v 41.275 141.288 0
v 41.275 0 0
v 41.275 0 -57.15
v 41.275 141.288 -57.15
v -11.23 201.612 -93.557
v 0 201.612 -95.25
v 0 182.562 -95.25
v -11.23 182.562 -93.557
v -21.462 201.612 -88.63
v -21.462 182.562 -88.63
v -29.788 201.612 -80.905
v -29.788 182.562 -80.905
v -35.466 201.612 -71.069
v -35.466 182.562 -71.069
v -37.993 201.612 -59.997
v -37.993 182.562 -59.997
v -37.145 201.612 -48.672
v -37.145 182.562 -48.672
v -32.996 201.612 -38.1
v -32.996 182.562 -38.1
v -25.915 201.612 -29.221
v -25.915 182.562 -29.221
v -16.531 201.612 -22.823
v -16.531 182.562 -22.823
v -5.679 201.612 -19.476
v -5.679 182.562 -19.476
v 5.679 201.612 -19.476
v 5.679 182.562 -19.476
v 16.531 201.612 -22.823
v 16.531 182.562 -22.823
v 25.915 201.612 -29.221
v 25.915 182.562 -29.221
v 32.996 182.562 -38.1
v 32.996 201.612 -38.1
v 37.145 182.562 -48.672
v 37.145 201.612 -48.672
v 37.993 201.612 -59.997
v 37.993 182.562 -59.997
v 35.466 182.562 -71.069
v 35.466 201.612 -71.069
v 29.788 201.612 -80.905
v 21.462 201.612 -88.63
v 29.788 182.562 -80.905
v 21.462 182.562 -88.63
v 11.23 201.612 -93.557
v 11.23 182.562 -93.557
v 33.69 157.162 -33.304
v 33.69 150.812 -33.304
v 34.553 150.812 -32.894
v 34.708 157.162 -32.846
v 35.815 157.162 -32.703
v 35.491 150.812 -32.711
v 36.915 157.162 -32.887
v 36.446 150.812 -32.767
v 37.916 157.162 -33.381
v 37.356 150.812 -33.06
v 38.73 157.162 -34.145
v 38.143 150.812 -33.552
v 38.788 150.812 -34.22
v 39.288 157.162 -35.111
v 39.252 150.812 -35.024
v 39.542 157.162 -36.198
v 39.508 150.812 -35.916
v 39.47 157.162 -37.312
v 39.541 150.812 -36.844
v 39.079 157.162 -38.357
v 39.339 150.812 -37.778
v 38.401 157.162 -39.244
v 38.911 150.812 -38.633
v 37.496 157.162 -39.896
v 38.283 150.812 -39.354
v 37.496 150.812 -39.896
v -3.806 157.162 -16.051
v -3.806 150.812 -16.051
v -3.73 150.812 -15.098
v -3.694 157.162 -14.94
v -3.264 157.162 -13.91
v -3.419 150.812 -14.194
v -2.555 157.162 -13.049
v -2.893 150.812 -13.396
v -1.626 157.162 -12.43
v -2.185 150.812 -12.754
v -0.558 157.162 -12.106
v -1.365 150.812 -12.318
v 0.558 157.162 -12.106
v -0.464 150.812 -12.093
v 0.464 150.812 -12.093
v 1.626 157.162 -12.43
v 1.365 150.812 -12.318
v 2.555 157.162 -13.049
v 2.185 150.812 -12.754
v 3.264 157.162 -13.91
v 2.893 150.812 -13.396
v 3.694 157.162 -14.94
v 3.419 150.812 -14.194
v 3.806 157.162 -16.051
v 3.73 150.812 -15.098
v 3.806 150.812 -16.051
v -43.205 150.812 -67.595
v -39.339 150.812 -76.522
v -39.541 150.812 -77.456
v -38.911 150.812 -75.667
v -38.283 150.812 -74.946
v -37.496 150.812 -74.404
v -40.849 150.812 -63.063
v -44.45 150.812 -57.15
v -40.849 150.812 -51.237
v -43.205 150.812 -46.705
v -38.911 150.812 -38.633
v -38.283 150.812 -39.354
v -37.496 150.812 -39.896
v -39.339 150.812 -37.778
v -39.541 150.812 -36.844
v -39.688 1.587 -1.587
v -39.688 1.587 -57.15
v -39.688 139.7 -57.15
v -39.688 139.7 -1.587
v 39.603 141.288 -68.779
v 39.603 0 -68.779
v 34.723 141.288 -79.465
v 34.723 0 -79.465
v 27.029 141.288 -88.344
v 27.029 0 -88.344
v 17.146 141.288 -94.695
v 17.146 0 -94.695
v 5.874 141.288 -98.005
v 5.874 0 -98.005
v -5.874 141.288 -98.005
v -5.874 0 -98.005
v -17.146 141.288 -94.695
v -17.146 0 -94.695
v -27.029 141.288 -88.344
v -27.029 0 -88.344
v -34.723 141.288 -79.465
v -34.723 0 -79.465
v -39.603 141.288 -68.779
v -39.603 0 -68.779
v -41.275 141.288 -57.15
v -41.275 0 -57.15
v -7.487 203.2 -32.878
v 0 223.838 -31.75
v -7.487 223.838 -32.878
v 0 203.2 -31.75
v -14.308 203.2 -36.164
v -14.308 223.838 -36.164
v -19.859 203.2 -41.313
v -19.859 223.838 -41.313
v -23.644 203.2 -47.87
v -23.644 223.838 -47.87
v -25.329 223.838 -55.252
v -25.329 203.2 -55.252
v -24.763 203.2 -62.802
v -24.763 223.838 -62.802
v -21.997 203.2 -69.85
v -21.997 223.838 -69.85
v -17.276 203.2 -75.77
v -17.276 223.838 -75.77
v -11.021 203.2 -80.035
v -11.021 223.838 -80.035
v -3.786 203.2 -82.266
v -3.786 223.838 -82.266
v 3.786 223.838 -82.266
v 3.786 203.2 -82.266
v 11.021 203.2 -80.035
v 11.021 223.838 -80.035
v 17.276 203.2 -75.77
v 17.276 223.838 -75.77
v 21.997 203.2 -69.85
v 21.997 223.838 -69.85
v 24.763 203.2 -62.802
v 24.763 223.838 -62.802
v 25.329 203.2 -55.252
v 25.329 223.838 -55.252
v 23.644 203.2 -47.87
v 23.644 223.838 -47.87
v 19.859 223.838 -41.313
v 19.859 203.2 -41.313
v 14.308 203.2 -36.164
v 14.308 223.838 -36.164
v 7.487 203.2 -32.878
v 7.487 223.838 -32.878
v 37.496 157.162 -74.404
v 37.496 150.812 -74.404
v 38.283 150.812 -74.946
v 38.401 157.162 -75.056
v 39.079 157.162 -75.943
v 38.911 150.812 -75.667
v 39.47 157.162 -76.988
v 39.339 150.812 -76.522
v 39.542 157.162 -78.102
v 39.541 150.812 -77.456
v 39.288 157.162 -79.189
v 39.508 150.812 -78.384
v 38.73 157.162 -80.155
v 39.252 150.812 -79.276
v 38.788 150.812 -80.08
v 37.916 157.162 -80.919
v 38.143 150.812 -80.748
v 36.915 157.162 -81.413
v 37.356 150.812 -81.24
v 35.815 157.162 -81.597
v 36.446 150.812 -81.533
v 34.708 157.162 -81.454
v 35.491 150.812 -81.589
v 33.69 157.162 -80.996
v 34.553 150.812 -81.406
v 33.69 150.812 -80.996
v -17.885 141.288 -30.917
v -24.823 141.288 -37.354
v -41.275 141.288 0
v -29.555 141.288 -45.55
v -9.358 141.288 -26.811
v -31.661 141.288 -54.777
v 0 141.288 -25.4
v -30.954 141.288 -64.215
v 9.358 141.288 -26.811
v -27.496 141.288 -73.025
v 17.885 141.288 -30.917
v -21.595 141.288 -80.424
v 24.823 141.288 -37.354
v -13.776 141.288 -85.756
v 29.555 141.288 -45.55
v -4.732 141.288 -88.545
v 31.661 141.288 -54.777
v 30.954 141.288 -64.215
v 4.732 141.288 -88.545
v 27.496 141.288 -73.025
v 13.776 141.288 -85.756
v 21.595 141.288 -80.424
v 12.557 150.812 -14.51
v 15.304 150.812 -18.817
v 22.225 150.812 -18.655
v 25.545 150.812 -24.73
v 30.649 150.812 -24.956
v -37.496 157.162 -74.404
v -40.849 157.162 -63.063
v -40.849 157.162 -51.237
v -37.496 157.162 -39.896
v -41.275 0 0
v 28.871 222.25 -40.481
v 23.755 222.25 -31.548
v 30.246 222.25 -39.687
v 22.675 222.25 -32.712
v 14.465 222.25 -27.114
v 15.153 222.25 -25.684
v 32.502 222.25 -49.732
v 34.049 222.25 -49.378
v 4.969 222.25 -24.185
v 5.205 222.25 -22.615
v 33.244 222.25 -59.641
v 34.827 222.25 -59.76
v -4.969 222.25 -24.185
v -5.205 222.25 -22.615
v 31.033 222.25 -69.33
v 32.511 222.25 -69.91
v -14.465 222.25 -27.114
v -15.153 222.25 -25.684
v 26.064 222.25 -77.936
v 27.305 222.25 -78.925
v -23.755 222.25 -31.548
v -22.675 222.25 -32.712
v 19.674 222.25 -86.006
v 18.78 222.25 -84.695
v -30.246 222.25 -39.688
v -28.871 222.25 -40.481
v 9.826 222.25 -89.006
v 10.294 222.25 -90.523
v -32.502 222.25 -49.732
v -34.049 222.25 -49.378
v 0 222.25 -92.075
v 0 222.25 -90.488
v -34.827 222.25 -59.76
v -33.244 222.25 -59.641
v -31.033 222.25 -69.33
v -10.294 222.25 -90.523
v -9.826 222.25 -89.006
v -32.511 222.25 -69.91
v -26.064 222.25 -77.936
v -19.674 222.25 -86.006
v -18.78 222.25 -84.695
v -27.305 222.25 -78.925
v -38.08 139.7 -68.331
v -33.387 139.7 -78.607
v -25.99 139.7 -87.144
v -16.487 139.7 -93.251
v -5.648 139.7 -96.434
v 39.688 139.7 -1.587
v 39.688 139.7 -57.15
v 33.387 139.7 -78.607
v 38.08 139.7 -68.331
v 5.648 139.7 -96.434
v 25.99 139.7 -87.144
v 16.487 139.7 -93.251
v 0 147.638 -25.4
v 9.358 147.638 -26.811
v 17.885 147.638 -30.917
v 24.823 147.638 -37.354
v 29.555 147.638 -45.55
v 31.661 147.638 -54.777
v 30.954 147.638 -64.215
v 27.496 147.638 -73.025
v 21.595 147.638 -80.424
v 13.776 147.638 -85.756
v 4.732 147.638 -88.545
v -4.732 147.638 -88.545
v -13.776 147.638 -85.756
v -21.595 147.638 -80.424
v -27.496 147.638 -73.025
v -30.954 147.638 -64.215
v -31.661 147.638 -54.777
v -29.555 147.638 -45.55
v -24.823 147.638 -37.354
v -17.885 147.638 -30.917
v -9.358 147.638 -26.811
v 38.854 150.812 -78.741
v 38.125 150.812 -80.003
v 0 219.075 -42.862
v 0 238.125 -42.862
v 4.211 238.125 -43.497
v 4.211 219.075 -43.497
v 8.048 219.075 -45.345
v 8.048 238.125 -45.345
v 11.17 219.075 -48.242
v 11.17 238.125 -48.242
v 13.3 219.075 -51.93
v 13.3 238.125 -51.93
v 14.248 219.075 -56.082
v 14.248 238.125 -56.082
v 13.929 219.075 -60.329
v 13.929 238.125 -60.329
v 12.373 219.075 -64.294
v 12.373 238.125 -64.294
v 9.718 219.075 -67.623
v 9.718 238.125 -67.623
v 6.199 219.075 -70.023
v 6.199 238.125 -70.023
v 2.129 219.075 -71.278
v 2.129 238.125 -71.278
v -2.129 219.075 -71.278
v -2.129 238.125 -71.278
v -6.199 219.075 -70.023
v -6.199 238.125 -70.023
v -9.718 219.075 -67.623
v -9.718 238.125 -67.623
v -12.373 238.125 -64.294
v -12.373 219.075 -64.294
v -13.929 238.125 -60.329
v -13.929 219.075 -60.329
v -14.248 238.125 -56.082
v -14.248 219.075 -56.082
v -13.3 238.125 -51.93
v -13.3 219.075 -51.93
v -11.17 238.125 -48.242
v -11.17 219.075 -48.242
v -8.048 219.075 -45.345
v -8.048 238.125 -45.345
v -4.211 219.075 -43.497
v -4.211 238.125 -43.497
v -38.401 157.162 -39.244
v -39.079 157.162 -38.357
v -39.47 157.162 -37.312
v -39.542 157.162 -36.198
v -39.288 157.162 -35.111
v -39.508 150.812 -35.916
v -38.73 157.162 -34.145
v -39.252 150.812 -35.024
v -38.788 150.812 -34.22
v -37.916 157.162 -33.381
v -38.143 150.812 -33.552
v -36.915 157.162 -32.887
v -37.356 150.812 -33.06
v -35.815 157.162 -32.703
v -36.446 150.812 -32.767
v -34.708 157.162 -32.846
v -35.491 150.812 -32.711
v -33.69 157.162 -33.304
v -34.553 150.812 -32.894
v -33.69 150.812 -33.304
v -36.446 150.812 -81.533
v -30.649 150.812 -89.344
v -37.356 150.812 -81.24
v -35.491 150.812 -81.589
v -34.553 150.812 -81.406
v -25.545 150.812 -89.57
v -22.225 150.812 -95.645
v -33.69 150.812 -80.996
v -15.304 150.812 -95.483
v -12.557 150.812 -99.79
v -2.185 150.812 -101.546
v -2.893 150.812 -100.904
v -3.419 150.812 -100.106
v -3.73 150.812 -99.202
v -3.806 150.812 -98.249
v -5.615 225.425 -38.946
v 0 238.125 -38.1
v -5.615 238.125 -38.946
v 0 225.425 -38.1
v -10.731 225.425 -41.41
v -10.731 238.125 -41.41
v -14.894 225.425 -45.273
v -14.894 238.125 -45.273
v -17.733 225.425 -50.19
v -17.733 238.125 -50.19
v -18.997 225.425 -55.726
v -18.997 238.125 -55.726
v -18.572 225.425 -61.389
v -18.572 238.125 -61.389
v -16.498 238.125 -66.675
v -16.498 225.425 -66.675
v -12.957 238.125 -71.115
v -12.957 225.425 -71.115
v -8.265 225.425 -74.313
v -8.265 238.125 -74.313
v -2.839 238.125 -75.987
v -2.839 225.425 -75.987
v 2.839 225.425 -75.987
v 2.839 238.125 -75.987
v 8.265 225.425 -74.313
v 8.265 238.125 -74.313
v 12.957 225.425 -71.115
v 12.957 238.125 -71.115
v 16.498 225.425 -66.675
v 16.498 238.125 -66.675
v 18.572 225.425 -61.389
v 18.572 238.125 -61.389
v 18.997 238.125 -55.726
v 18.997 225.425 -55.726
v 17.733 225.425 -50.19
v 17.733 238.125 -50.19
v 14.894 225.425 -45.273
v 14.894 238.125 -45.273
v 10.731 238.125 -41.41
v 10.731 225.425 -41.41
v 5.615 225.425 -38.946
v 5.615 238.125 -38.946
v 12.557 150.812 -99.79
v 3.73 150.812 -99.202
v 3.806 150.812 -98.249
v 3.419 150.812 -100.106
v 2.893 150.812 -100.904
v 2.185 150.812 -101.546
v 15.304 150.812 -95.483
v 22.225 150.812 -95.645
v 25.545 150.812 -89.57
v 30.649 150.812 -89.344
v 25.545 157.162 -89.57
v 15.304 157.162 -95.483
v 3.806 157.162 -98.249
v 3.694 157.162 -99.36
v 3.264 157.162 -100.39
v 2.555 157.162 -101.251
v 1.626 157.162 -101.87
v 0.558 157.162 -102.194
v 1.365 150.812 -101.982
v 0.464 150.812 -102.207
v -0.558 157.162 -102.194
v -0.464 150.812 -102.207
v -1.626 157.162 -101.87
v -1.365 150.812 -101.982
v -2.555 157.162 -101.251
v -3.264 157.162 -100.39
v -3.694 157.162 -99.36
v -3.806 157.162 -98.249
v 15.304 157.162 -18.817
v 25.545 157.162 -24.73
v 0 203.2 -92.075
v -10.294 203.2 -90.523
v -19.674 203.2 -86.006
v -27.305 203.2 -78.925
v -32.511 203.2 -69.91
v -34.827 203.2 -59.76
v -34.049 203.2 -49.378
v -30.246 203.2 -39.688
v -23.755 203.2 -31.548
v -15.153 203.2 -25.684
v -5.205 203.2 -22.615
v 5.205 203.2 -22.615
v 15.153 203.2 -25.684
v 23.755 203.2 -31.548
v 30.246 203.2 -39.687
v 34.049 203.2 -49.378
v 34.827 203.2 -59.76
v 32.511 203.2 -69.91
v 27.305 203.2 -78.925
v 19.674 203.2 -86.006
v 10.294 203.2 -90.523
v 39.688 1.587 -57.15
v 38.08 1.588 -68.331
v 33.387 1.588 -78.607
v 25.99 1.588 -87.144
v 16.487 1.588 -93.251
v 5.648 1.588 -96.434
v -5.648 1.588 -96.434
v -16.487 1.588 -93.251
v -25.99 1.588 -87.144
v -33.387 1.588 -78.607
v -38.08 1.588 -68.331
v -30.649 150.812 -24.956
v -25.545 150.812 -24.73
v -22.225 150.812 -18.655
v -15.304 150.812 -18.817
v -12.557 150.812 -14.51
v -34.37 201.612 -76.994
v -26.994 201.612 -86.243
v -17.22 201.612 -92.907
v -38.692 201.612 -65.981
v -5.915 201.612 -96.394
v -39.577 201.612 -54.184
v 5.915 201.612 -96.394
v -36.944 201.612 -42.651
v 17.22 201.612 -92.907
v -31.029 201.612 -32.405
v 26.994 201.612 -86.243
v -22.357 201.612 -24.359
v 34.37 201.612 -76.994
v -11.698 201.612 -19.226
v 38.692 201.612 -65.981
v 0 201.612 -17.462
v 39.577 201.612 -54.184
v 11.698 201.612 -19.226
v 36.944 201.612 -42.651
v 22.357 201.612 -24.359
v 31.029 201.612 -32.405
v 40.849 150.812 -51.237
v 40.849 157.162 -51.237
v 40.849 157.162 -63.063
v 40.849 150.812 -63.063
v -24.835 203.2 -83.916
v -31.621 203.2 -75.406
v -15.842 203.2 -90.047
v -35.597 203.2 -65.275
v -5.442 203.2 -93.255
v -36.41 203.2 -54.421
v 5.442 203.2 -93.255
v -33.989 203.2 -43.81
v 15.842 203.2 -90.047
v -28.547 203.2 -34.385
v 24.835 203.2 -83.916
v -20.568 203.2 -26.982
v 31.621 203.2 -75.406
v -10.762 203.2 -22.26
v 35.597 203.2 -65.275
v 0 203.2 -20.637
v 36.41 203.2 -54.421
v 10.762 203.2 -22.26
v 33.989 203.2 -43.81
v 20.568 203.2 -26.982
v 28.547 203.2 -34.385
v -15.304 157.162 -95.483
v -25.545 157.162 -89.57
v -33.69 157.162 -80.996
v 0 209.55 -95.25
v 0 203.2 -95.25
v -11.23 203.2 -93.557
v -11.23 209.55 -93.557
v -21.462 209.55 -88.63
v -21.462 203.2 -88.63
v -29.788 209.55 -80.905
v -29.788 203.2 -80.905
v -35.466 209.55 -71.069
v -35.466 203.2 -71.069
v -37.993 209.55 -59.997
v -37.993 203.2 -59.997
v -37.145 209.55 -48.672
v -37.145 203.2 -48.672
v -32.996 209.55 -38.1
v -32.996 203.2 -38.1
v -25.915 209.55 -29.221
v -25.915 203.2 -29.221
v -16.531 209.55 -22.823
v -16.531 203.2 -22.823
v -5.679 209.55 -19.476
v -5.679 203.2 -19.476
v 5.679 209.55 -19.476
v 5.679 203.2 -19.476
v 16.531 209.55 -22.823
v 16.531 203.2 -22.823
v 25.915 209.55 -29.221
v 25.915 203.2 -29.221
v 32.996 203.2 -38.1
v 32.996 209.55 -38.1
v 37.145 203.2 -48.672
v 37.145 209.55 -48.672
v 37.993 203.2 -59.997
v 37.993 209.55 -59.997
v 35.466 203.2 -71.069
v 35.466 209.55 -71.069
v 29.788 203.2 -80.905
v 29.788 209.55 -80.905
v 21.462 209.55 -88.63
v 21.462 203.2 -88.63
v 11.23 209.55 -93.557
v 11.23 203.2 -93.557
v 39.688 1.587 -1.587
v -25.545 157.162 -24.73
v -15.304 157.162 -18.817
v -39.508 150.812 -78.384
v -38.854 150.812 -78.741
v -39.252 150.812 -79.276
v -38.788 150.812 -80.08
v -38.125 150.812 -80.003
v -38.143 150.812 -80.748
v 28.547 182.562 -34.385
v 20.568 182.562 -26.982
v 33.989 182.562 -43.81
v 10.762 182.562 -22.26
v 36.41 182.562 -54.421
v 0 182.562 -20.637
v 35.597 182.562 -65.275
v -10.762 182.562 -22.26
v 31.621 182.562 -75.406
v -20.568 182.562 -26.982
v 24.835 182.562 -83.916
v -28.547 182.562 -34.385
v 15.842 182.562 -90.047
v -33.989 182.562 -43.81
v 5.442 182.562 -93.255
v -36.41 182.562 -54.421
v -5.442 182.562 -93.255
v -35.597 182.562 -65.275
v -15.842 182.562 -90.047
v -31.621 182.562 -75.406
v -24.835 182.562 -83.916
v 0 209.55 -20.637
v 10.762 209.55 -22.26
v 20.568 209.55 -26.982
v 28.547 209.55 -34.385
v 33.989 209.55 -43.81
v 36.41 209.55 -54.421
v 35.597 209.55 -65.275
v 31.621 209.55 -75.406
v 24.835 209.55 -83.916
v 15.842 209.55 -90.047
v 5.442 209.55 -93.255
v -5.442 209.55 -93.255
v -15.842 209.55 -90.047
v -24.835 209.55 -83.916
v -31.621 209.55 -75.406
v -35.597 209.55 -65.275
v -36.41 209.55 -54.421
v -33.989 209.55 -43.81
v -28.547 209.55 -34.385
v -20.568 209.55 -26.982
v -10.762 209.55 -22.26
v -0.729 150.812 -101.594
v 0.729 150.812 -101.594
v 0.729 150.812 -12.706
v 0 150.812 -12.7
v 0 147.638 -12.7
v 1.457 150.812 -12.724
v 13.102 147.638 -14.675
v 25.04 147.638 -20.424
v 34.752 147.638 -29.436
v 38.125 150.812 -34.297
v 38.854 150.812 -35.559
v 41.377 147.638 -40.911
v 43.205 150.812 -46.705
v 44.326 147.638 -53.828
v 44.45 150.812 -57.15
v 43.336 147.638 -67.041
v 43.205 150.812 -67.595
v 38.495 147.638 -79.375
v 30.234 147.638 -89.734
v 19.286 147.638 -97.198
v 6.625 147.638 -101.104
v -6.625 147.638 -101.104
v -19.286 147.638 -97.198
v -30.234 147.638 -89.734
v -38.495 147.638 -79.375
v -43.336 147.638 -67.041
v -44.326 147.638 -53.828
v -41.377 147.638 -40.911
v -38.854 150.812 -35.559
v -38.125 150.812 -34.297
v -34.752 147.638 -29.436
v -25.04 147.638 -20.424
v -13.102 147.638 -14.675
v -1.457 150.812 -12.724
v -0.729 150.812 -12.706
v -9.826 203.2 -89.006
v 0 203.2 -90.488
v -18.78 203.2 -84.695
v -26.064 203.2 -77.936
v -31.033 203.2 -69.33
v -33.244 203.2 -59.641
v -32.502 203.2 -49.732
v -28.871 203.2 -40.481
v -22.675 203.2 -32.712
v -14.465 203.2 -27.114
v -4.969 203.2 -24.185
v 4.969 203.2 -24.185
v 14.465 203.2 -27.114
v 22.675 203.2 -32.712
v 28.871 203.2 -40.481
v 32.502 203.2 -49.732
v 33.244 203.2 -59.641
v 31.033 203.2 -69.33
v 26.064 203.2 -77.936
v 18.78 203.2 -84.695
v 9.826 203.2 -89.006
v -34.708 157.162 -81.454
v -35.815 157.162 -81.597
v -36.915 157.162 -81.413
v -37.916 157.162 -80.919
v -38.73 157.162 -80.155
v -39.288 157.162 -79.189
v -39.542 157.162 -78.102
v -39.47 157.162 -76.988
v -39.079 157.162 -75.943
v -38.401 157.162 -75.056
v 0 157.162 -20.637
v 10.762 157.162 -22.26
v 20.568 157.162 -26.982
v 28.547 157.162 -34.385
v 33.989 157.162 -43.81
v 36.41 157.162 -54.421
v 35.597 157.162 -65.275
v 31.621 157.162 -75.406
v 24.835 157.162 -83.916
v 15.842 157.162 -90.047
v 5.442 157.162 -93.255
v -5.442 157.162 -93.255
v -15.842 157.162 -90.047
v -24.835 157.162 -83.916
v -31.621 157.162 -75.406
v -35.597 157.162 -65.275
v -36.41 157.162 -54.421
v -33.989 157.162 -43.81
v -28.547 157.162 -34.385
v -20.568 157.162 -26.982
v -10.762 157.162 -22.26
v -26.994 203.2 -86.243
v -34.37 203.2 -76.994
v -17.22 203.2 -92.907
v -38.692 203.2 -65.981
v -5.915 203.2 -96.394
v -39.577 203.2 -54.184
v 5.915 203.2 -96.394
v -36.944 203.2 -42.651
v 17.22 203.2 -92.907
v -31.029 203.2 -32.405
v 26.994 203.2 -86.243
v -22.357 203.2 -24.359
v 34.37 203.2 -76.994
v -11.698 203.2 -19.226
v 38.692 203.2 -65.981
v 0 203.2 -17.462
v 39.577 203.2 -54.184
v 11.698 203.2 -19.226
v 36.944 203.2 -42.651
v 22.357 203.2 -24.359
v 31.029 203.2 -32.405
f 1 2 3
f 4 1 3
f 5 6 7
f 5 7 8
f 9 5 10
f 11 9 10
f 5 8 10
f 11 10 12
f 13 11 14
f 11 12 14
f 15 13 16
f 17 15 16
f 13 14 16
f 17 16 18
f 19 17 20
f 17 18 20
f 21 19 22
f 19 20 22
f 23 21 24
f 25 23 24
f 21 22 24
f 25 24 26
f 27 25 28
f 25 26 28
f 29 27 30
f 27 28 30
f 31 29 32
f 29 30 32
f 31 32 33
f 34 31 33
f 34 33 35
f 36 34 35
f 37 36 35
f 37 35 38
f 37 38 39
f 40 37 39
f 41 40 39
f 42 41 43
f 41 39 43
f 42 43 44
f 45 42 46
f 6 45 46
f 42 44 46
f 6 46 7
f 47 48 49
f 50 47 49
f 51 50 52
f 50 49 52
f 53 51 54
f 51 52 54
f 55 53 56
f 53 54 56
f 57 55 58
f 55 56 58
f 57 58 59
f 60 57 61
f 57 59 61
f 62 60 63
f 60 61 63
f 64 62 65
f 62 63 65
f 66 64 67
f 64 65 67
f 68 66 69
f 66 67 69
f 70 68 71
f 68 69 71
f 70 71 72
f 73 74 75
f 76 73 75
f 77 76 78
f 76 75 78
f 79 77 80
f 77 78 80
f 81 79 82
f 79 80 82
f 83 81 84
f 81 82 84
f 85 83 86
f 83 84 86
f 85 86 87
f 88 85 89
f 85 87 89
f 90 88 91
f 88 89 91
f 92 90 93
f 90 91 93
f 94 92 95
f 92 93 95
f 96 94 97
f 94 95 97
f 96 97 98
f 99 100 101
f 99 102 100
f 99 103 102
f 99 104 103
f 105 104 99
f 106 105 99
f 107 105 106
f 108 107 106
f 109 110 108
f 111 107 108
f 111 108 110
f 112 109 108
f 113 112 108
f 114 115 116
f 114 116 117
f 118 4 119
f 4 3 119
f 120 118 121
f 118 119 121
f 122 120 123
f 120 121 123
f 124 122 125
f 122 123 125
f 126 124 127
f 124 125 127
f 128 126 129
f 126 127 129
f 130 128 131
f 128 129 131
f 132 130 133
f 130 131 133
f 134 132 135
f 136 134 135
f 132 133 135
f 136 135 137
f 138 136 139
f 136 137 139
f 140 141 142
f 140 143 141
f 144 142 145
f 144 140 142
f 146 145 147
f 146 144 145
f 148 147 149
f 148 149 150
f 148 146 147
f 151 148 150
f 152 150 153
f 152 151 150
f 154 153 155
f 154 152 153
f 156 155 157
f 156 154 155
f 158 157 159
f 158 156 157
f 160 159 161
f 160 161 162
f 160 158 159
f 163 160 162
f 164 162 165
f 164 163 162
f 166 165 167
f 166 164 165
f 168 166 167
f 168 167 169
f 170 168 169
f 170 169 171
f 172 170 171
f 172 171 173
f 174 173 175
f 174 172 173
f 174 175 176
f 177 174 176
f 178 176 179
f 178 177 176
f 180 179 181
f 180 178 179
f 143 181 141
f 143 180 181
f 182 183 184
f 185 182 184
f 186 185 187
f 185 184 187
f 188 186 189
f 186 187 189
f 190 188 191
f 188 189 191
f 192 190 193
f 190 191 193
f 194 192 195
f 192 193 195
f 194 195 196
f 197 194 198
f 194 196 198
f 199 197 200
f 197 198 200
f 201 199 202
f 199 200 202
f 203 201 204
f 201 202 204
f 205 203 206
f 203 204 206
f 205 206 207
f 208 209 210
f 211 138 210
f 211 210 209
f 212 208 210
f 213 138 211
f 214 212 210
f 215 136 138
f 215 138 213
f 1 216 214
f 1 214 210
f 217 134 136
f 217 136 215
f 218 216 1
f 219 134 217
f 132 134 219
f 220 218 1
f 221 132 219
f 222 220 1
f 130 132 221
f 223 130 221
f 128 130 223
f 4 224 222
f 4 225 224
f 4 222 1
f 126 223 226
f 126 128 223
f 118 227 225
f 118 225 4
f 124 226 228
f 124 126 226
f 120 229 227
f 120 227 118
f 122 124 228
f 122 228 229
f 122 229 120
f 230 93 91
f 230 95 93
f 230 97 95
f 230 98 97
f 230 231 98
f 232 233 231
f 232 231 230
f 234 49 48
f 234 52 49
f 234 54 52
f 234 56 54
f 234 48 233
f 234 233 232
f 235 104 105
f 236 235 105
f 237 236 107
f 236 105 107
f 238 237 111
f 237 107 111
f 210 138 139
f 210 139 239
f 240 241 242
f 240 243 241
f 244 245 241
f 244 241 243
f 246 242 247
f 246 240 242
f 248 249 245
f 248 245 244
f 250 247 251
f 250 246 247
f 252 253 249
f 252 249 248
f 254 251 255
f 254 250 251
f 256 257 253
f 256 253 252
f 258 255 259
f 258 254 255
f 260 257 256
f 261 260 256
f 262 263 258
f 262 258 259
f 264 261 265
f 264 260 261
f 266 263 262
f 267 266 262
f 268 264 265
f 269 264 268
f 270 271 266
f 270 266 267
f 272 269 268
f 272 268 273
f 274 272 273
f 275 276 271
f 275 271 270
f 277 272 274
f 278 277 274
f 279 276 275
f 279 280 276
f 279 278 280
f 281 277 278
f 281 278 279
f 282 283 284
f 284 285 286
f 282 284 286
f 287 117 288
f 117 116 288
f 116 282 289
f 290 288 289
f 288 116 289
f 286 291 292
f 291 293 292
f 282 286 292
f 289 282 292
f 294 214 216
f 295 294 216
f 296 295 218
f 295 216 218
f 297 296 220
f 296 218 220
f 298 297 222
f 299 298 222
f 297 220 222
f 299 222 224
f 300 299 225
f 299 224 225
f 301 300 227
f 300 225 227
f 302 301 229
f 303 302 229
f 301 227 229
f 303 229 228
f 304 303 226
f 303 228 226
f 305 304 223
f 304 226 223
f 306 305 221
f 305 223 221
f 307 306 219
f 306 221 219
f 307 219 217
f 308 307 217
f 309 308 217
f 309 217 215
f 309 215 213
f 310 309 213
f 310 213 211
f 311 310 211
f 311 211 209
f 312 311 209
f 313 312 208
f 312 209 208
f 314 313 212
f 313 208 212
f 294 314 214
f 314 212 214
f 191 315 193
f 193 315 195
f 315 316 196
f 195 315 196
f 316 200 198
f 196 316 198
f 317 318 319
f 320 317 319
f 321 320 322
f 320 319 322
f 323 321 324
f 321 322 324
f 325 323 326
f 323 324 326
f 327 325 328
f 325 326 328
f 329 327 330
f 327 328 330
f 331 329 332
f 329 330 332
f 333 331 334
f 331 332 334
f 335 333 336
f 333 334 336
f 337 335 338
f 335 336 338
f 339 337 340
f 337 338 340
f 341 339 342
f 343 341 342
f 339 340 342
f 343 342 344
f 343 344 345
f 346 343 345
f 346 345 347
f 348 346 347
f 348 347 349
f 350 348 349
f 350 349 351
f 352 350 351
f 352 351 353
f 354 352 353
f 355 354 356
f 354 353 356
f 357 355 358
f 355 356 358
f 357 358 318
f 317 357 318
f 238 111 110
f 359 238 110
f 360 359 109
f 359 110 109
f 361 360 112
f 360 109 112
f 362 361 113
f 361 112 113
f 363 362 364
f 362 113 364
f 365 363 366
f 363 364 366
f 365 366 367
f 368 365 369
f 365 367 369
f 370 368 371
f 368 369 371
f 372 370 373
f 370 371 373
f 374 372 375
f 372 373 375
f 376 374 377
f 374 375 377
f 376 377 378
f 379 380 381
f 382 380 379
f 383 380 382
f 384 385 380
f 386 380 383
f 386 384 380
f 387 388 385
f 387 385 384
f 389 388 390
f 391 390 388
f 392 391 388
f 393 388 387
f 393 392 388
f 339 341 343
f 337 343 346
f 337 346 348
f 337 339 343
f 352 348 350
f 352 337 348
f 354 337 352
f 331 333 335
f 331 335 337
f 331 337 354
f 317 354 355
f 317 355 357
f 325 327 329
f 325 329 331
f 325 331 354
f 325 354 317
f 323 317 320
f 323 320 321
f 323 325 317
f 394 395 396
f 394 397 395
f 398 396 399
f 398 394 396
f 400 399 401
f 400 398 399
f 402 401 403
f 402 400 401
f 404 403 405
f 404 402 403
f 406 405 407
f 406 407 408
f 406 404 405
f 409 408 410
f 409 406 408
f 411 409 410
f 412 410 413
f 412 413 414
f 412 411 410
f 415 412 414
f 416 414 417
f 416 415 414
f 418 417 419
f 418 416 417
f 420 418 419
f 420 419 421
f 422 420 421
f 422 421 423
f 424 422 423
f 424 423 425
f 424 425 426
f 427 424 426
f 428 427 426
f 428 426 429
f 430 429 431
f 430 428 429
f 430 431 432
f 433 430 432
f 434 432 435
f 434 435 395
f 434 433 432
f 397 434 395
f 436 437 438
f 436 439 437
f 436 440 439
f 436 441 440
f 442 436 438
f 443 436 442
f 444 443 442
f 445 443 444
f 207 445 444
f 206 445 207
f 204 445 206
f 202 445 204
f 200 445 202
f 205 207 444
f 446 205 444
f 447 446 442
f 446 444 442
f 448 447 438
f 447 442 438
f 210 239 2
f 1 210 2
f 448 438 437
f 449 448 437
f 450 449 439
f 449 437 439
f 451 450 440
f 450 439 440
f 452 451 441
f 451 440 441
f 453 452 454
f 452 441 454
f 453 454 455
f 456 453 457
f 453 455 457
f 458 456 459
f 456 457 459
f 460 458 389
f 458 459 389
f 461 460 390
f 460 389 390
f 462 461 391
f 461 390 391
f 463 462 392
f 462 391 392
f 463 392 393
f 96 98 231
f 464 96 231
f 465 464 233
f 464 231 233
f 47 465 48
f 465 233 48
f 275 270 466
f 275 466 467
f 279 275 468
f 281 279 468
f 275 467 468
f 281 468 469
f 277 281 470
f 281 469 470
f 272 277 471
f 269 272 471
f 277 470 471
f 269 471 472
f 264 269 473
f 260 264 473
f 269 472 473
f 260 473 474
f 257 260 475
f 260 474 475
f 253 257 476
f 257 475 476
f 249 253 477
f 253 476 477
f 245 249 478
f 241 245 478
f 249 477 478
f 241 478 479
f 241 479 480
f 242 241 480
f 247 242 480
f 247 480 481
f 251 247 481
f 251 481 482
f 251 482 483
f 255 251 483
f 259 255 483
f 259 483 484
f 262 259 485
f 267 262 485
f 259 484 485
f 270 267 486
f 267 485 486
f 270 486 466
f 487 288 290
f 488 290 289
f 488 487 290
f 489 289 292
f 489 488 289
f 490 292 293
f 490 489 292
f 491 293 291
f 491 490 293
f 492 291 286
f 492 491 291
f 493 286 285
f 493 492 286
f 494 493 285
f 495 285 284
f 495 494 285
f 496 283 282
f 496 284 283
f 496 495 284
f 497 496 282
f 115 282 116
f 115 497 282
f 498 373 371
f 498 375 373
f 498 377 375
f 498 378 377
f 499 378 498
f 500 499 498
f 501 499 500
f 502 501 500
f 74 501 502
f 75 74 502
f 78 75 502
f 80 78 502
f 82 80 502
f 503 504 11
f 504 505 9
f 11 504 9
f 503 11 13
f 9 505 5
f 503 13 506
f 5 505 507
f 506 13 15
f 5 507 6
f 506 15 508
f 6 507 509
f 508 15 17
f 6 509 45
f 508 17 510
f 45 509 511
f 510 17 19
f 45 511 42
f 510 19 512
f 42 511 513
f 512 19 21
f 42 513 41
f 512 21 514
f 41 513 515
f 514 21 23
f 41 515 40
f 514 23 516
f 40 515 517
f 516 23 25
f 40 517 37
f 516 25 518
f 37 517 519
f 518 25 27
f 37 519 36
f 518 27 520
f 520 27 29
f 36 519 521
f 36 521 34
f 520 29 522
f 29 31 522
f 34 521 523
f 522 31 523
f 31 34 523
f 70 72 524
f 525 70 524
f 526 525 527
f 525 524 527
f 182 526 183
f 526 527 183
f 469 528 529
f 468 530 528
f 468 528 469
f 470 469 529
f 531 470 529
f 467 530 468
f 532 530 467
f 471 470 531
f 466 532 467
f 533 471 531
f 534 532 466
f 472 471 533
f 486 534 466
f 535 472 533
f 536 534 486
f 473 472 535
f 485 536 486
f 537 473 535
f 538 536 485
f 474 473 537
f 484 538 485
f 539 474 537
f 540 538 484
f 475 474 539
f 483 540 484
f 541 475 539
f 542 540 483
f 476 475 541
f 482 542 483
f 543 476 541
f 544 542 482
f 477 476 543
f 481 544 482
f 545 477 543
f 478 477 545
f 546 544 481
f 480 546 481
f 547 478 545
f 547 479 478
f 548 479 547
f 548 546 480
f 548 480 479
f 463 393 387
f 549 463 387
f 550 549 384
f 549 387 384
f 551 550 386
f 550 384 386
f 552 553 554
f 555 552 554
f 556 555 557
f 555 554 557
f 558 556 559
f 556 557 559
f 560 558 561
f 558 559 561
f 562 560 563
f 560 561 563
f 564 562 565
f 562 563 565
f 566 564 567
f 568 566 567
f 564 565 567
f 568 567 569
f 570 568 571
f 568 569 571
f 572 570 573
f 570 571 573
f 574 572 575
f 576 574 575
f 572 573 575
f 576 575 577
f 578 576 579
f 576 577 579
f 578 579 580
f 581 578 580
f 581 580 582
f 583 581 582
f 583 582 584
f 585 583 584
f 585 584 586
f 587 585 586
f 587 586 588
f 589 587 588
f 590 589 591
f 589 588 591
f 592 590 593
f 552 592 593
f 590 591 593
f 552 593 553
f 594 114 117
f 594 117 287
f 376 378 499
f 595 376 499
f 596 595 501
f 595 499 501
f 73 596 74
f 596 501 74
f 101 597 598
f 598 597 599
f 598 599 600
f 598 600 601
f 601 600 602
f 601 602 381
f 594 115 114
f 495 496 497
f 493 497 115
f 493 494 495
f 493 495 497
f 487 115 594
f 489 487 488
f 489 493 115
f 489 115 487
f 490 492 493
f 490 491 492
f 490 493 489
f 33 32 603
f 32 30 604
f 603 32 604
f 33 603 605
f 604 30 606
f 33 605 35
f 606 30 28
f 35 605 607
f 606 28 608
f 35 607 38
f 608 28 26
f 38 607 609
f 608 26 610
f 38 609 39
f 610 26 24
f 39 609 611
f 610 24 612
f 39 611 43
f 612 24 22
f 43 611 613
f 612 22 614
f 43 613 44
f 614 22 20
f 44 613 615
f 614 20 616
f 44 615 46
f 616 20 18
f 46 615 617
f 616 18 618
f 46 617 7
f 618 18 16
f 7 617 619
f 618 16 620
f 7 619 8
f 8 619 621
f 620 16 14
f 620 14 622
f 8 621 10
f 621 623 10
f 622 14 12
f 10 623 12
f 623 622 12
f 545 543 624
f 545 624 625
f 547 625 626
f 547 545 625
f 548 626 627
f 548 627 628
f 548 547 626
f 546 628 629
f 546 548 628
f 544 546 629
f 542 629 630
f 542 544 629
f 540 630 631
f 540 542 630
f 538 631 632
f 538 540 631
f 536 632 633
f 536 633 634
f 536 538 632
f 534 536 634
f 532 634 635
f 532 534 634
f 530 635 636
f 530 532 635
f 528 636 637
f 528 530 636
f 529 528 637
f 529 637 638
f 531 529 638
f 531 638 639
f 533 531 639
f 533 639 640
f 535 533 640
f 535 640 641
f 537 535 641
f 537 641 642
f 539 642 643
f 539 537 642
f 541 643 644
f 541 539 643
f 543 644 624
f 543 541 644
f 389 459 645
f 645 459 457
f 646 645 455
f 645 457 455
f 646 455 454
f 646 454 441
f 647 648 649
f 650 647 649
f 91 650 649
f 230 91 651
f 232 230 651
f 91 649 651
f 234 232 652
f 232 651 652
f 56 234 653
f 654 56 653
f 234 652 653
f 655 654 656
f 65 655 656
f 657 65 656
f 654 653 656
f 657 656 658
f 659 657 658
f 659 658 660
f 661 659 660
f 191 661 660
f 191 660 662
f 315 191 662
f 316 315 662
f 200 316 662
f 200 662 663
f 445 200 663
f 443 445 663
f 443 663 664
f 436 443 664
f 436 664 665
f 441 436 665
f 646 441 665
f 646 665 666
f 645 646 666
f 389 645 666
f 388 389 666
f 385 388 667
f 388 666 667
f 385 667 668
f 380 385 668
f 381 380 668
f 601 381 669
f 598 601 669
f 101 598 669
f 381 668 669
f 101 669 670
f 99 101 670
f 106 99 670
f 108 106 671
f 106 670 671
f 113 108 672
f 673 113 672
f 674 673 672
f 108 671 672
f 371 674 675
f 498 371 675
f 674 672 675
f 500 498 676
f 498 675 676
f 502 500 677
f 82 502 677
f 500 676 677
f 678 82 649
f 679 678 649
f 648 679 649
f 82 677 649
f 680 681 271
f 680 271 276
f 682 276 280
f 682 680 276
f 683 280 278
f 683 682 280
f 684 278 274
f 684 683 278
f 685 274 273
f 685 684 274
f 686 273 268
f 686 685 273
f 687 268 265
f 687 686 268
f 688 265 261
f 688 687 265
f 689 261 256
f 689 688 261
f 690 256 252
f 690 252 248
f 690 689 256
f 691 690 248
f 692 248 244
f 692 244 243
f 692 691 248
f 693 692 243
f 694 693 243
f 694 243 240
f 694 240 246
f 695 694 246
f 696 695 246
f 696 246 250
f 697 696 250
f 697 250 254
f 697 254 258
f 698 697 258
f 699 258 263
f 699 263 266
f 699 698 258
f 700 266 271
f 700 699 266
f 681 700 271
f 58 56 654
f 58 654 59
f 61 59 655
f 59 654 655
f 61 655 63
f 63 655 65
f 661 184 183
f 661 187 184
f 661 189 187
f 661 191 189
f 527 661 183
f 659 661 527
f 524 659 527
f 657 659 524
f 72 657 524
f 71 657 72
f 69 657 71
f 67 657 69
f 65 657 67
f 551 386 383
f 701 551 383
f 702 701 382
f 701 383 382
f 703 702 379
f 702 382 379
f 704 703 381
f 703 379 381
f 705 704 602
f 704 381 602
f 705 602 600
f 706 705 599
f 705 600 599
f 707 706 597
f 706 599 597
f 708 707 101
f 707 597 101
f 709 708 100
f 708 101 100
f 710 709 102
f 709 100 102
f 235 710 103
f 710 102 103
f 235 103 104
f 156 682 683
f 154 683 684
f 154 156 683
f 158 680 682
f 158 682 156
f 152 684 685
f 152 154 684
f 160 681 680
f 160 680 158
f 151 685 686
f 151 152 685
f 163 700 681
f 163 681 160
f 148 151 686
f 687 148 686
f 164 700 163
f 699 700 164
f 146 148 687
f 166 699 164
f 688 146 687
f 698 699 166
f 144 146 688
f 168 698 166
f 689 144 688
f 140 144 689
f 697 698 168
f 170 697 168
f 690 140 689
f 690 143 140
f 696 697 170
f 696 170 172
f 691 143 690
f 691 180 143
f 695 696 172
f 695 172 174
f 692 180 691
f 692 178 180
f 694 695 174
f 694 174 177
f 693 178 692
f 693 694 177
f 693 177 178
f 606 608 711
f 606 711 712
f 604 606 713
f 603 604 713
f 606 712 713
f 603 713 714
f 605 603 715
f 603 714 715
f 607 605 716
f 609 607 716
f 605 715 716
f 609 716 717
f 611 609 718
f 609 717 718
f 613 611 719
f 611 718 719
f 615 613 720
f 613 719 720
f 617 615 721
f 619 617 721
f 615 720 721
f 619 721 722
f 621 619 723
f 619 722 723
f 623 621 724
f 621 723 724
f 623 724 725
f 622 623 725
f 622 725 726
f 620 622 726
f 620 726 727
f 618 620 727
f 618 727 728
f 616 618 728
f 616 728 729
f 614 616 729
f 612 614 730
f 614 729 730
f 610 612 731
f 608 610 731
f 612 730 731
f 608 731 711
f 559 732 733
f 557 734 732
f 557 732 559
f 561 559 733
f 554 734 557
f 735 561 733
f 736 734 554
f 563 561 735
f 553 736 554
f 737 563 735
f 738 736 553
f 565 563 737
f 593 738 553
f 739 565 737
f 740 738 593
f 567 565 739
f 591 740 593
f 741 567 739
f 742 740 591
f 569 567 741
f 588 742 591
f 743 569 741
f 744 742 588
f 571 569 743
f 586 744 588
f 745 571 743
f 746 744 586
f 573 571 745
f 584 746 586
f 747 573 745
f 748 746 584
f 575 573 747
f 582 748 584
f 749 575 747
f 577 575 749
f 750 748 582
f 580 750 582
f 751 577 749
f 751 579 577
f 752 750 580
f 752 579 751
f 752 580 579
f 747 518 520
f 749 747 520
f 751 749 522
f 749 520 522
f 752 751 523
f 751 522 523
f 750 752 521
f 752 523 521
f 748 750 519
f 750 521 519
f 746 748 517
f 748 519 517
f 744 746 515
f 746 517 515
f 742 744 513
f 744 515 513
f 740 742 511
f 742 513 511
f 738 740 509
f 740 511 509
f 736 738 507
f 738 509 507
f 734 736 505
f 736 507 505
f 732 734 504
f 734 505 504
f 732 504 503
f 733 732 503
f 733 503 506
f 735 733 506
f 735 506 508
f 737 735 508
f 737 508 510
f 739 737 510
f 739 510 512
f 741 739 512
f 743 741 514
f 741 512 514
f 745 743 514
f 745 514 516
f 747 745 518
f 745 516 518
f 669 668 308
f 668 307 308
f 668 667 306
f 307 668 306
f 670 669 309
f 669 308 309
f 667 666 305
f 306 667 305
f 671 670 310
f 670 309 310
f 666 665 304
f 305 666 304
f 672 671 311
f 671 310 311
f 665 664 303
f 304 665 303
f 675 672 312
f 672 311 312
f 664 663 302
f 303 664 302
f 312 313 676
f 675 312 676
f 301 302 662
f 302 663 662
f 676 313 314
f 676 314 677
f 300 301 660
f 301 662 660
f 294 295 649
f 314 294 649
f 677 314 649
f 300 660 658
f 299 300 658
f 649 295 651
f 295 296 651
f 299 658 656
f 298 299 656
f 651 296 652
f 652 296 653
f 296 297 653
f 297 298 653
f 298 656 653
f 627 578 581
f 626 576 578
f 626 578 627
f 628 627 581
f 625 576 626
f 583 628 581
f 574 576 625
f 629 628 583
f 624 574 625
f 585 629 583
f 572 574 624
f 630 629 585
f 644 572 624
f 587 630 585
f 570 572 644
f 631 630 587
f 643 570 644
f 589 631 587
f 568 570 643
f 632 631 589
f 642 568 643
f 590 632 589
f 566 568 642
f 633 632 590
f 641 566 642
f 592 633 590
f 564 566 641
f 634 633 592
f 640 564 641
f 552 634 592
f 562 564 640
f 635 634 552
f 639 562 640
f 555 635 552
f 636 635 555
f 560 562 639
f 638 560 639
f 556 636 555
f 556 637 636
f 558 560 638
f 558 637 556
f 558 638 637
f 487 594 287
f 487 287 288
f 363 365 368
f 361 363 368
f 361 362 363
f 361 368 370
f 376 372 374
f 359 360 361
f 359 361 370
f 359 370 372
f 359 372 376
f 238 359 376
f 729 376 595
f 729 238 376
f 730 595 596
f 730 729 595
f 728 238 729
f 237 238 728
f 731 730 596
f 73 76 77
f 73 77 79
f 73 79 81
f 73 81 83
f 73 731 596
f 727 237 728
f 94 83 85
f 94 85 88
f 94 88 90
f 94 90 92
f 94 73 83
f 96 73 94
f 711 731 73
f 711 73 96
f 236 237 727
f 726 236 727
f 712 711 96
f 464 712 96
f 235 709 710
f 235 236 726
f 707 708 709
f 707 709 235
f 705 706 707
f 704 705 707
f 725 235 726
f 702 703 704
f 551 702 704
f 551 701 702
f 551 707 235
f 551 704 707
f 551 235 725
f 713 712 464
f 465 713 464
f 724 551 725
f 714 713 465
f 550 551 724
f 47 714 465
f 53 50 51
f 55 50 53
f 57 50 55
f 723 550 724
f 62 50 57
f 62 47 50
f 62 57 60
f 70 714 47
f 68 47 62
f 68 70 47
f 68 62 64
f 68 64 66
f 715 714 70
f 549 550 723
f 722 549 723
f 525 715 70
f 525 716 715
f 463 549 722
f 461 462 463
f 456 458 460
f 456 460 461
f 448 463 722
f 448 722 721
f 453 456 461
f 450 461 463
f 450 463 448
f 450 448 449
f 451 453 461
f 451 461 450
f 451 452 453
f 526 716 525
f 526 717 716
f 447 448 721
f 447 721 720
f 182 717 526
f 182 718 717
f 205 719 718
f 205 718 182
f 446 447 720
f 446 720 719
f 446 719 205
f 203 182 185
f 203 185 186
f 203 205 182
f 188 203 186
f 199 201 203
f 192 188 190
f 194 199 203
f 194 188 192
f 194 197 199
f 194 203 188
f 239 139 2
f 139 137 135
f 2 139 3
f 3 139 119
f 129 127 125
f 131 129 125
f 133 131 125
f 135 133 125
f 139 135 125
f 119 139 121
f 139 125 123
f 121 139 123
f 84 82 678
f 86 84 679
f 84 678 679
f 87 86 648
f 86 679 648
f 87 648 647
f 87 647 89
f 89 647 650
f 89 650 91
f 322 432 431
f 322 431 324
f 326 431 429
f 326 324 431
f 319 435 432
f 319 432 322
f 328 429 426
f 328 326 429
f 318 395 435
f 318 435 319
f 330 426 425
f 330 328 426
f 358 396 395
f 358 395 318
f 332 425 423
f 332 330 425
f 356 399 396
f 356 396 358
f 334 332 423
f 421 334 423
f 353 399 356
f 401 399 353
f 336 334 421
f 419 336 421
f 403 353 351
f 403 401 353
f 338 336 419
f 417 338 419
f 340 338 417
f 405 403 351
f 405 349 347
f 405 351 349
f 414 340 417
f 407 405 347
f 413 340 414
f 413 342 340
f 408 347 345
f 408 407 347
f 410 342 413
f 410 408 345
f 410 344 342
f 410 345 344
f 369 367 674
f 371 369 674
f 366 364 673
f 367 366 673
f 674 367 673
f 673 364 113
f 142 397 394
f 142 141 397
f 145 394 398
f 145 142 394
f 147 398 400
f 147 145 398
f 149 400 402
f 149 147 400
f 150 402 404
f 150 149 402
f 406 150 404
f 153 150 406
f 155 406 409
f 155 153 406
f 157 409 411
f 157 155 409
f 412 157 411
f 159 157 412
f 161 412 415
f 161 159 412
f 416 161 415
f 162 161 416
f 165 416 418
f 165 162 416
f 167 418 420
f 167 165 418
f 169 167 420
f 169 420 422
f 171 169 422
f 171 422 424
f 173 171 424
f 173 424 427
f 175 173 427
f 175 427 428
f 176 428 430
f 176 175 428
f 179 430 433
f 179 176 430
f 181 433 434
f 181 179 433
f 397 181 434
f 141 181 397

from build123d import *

# Parameters (mm, degrees)
BOSS_EXTRUDE1_DEPTH  = 139.7
SHELL1_T             = -1.5875
BOSS_EXTRUDE2_DEPTH  = 1.5875
SKETCH3_R            = 31.75
BOSS_EXTRUDE3_DEPTH  = 6.35
SKETCH4_R            = 44.45
BOSS_EXTRUDE4_DEPTH  = 3.175
BOSS_EXTRUDE5_DEPTH  = 6.35
SKETCH6_R            = 36.5125
BOSS_EXTRUDE6_DEPTH  = 25.4
SKETCH8_R            = 38.1
BOSS_EXTRUDE7_DEPTH  = 19.05
SKETCH9_R            = 39.6875
BOSS_EXTRUDE8_DEPTH  = 1.5875
SKETCH10_R           = 38.1
SKETCH10_R_2         = 36.5125
BOSS_EXTRUDE9_DEPTH  = 6.35
SKETCH12_R           = 34.925
SKETCH12_R_2         = 33.3375
BOSS_EXTRUDE10_DEPTH = 19.05
SKETCH15_R           = 14.2875
CUT_EXTRUDE1_DEPTH   = 19.05


with BuildPart() as part:
    # Sketch1 → Boss-Extrude1 (new body)
    with BuildSketch(Plane(origin=(0, 0, 0), x_dir=(1, 0, 0), z_dir=(0, 1, 0))):
        with BuildLine():
            Line((-41.275, 0), (41.275, 0))
            Line((41.275, 0), (41.275, 57.15))
            ThreePointArc((41.275, 57.15), (0, 98.425), (-41.275, 57.15))
            Line((-41.275, 57.15), (-41.275, 0))
        make_face()
    extrude(amount=BOSS_EXTRUDE1_DEPTH)

    # Shell1
    shell1_openings = [part.faces().sort_by_distance(p)[0] for p in [
        (0, 139.7, -45.257423889),
    ]]
    offset(amount=SHELL1_T, openings=shell1_openings, kind=Kind.INTERSECTION)

    # Sketch2 → Boss-Extrude2 (add)
    with BuildSketch(Plane(origin=(0, 139.7, 0), x_dir=(1, 0, 0), z_dir=(0, 1, 0))):
        with BuildLine():
            Line((41.275, 0), (41.275, 57.15))
            ThreePointArc((41.275, 57.15), (0, 98.425), (-41.275, 57.15))
            Line((-41.275, 57.15), (-41.275, 0))
            Line((-41.275, 0), (41.275, 0))
        make_face()
    extrude(amount=BOSS_EXTRUDE2_DEPTH)

    # Sketch3 → Boss-Extrude3 (add)
    with BuildSketch(Plane(origin=(0, 141.2875, 0), x_dir=(1, 0, 0), z_dir=(0, 1, 0))):
        with Locations(Location((0, 57.15, 0), (0, 0, 270))):
            Circle(SKETCH3_R)
    extrude(amount=BOSS_EXTRUDE3_DEPTH)

    # Sketch4 → Boss-Extrude4 (add)
    with BuildSketch(Plane(origin=(0, 147.6375, 0), x_dir=(1, 0, 0), z_dir=(0, 1, 0))):
        with Locations(Location((0, 57.15, 0), (0, 0, 270))):
            Circle(SKETCH4_R)
    extrude(amount=BOSS_EXTRUDE4_DEPTH)

    # Sketch5 → Boss-Extrude5 (add)
    with BuildSketch(Plane(origin=(0, 150.8125, 0), x_dir=(1, 0, 0), z_dir=(0, 1, 0))):
        with BuildLine():
            ThreePointArc((-3.805939848, 98.249153846), (-20.6375, 92.895198541), (-33.689941381, 80.995617517))
            ThreePointArc((-33.689941381, 80.995617517), (-39.04475533, 79.6925), (-37.495881229, 74.403536329))
            ThreePointArc((-37.495881229, 74.403536329), (-41.275, 57.15), (-37.495881229, 39.896463671))
            ThreePointArc((-37.495881229, 39.896463671), (-39.04475533, 34.6075), (-33.689941381, 33.304382483))
            ThreePointArc((-33.689941381, 33.304382483), (-20.6375, 21.404801459), (-3.805939848, 16.050846154))
            ThreePointArc((-3.805939848, 16.050846154), (0, 12.065), (3.805939848, 16.050846154))
            ThreePointArc((3.805939848, 16.050846154), (20.6375, 21.404801459), (33.689941381, 33.304382483))
            ThreePointArc((33.689941381, 33.304382483), (39.04475533, 34.6075), (37.495881229, 39.896463671))
            ThreePointArc((37.495881229, 39.896463671), (41.275, 57.15), (37.495881229, 74.403536329))
            ThreePointArc((37.495881229, 74.403536329), (39.04475533, 79.6925), (33.689941381, 80.995617517))
            ThreePointArc((33.689941381, 80.995617517), (20.6375, 92.895198541), (3.805939848, 98.249153846))
            ThreePointArc((3.805939848, 98.249153846), (0, 102.235), (-3.805939848, 98.249153846))
        make_face()
    extrude(amount=BOSS_EXTRUDE5_DEPTH)

    # Sketch6 → Boss-Extrude6 (add)
    with BuildSketch(Plane(origin=(0, 157.1625, 0), x_dir=(1, 0, 0), z_dir=(0, 1, 0))):
        with Locations(Location((0, 57.15, 0), (0, 0, 270))):
            Circle(SKETCH6_R)
    extrude(amount=BOSS_EXTRUDE6_DEPTH)

    # Sketch8 → Boss-Extrude7 (add)
    with BuildSketch(Plane(origin=(0, 182.5625, 0), x_dir=(1, 0, 0), z_dir=(0, 1, 0))):
        with Locations(Location((0, 57.15, 0), (0, 0, 90))):
            Circle(SKETCH8_R)
    extrude(amount=BOSS_EXTRUDE7_DEPTH)

    # Sketch9 → Boss-Extrude8 (add)
    with BuildSketch(Plane(origin=(0, 201.6125, 0), x_dir=(1, 0, 0), z_dir=(0, 1, 0))):
        with Locations(Location((0, 57.15, 0), (0, 0, 270))):
            Circle(SKETCH9_R)
    extrude(amount=BOSS_EXTRUDE8_DEPTH)

    # Sketch10 → Boss-Extrude9 (add)
    with BuildSketch(Plane(origin=(0, 203.2, 0), x_dir=(1, 0, 0), z_dir=(0, 1, 0))):
        with Locations(Location((0, 57.15, 0), (0, 0, 90))):
            Circle(SKETCH10_R)
        with Locations(Location((0, 57.15, 0), (0, 0, 270))):
            Circle(SKETCH10_R_2, mode=Mode.SUBTRACT)
    extrude(amount=BOSS_EXTRUDE9_DEPTH)

    # Sketch12 → Boss-Extrude10 (add)
    with BuildSketch(Plane(origin=(0, 203.2, 0), x_dir=(1, 0, 0), z_dir=(0, 1, 0))):
        with Locations(Location((0, 57.15, 0), (0, 0, 90))):
            Circle(SKETCH12_R)
        with Locations(Location((0, 57.15, 0), (0, 0, 90))):
            Circle(SKETCH12_R_2, mode=Mode.SUBTRACT)
    extrude(amount=BOSS_EXTRUDE10_DEPTH)

    # Sketch14 → Revolve1 (revolve)
    with BuildSketch(Plane(origin=(0, 0, 0), x_dir=(0, 0, -1), z_dir=(1, 0, 0)), mode=Mode.PRIVATE) as revolve1_sk:
        Polygon((57.15, 238.125), (76.2, 238.125), (76.2, 225.425), (82.55, 223.8375), (82.55, 203.2), (57.15, 203.2), align=None)
    revolve(revolve1_sk.sketch.rotate(Axis((0, 235.492882867, -57.15), (0, -1, 0)), 180), axis=Axis((0, 235.492882867, -57.15), (0, -1, 0)))

    # Sketch15 → Cut-Extrude1 (cut)
    with BuildSketch(Plane(origin=(0, 238.125, 0), x_dir=(1, 0, 0), z_dir=(0, 1, 0))):
        with Locations(Location((0, 57.15, 0), (0, 0, 270))):
            Circle(SKETCH15_R)
    extrude(amount=-CUT_EXTRUDE1_DEPTH, mode=Mode.SUBTRACT)


solid = part.part
